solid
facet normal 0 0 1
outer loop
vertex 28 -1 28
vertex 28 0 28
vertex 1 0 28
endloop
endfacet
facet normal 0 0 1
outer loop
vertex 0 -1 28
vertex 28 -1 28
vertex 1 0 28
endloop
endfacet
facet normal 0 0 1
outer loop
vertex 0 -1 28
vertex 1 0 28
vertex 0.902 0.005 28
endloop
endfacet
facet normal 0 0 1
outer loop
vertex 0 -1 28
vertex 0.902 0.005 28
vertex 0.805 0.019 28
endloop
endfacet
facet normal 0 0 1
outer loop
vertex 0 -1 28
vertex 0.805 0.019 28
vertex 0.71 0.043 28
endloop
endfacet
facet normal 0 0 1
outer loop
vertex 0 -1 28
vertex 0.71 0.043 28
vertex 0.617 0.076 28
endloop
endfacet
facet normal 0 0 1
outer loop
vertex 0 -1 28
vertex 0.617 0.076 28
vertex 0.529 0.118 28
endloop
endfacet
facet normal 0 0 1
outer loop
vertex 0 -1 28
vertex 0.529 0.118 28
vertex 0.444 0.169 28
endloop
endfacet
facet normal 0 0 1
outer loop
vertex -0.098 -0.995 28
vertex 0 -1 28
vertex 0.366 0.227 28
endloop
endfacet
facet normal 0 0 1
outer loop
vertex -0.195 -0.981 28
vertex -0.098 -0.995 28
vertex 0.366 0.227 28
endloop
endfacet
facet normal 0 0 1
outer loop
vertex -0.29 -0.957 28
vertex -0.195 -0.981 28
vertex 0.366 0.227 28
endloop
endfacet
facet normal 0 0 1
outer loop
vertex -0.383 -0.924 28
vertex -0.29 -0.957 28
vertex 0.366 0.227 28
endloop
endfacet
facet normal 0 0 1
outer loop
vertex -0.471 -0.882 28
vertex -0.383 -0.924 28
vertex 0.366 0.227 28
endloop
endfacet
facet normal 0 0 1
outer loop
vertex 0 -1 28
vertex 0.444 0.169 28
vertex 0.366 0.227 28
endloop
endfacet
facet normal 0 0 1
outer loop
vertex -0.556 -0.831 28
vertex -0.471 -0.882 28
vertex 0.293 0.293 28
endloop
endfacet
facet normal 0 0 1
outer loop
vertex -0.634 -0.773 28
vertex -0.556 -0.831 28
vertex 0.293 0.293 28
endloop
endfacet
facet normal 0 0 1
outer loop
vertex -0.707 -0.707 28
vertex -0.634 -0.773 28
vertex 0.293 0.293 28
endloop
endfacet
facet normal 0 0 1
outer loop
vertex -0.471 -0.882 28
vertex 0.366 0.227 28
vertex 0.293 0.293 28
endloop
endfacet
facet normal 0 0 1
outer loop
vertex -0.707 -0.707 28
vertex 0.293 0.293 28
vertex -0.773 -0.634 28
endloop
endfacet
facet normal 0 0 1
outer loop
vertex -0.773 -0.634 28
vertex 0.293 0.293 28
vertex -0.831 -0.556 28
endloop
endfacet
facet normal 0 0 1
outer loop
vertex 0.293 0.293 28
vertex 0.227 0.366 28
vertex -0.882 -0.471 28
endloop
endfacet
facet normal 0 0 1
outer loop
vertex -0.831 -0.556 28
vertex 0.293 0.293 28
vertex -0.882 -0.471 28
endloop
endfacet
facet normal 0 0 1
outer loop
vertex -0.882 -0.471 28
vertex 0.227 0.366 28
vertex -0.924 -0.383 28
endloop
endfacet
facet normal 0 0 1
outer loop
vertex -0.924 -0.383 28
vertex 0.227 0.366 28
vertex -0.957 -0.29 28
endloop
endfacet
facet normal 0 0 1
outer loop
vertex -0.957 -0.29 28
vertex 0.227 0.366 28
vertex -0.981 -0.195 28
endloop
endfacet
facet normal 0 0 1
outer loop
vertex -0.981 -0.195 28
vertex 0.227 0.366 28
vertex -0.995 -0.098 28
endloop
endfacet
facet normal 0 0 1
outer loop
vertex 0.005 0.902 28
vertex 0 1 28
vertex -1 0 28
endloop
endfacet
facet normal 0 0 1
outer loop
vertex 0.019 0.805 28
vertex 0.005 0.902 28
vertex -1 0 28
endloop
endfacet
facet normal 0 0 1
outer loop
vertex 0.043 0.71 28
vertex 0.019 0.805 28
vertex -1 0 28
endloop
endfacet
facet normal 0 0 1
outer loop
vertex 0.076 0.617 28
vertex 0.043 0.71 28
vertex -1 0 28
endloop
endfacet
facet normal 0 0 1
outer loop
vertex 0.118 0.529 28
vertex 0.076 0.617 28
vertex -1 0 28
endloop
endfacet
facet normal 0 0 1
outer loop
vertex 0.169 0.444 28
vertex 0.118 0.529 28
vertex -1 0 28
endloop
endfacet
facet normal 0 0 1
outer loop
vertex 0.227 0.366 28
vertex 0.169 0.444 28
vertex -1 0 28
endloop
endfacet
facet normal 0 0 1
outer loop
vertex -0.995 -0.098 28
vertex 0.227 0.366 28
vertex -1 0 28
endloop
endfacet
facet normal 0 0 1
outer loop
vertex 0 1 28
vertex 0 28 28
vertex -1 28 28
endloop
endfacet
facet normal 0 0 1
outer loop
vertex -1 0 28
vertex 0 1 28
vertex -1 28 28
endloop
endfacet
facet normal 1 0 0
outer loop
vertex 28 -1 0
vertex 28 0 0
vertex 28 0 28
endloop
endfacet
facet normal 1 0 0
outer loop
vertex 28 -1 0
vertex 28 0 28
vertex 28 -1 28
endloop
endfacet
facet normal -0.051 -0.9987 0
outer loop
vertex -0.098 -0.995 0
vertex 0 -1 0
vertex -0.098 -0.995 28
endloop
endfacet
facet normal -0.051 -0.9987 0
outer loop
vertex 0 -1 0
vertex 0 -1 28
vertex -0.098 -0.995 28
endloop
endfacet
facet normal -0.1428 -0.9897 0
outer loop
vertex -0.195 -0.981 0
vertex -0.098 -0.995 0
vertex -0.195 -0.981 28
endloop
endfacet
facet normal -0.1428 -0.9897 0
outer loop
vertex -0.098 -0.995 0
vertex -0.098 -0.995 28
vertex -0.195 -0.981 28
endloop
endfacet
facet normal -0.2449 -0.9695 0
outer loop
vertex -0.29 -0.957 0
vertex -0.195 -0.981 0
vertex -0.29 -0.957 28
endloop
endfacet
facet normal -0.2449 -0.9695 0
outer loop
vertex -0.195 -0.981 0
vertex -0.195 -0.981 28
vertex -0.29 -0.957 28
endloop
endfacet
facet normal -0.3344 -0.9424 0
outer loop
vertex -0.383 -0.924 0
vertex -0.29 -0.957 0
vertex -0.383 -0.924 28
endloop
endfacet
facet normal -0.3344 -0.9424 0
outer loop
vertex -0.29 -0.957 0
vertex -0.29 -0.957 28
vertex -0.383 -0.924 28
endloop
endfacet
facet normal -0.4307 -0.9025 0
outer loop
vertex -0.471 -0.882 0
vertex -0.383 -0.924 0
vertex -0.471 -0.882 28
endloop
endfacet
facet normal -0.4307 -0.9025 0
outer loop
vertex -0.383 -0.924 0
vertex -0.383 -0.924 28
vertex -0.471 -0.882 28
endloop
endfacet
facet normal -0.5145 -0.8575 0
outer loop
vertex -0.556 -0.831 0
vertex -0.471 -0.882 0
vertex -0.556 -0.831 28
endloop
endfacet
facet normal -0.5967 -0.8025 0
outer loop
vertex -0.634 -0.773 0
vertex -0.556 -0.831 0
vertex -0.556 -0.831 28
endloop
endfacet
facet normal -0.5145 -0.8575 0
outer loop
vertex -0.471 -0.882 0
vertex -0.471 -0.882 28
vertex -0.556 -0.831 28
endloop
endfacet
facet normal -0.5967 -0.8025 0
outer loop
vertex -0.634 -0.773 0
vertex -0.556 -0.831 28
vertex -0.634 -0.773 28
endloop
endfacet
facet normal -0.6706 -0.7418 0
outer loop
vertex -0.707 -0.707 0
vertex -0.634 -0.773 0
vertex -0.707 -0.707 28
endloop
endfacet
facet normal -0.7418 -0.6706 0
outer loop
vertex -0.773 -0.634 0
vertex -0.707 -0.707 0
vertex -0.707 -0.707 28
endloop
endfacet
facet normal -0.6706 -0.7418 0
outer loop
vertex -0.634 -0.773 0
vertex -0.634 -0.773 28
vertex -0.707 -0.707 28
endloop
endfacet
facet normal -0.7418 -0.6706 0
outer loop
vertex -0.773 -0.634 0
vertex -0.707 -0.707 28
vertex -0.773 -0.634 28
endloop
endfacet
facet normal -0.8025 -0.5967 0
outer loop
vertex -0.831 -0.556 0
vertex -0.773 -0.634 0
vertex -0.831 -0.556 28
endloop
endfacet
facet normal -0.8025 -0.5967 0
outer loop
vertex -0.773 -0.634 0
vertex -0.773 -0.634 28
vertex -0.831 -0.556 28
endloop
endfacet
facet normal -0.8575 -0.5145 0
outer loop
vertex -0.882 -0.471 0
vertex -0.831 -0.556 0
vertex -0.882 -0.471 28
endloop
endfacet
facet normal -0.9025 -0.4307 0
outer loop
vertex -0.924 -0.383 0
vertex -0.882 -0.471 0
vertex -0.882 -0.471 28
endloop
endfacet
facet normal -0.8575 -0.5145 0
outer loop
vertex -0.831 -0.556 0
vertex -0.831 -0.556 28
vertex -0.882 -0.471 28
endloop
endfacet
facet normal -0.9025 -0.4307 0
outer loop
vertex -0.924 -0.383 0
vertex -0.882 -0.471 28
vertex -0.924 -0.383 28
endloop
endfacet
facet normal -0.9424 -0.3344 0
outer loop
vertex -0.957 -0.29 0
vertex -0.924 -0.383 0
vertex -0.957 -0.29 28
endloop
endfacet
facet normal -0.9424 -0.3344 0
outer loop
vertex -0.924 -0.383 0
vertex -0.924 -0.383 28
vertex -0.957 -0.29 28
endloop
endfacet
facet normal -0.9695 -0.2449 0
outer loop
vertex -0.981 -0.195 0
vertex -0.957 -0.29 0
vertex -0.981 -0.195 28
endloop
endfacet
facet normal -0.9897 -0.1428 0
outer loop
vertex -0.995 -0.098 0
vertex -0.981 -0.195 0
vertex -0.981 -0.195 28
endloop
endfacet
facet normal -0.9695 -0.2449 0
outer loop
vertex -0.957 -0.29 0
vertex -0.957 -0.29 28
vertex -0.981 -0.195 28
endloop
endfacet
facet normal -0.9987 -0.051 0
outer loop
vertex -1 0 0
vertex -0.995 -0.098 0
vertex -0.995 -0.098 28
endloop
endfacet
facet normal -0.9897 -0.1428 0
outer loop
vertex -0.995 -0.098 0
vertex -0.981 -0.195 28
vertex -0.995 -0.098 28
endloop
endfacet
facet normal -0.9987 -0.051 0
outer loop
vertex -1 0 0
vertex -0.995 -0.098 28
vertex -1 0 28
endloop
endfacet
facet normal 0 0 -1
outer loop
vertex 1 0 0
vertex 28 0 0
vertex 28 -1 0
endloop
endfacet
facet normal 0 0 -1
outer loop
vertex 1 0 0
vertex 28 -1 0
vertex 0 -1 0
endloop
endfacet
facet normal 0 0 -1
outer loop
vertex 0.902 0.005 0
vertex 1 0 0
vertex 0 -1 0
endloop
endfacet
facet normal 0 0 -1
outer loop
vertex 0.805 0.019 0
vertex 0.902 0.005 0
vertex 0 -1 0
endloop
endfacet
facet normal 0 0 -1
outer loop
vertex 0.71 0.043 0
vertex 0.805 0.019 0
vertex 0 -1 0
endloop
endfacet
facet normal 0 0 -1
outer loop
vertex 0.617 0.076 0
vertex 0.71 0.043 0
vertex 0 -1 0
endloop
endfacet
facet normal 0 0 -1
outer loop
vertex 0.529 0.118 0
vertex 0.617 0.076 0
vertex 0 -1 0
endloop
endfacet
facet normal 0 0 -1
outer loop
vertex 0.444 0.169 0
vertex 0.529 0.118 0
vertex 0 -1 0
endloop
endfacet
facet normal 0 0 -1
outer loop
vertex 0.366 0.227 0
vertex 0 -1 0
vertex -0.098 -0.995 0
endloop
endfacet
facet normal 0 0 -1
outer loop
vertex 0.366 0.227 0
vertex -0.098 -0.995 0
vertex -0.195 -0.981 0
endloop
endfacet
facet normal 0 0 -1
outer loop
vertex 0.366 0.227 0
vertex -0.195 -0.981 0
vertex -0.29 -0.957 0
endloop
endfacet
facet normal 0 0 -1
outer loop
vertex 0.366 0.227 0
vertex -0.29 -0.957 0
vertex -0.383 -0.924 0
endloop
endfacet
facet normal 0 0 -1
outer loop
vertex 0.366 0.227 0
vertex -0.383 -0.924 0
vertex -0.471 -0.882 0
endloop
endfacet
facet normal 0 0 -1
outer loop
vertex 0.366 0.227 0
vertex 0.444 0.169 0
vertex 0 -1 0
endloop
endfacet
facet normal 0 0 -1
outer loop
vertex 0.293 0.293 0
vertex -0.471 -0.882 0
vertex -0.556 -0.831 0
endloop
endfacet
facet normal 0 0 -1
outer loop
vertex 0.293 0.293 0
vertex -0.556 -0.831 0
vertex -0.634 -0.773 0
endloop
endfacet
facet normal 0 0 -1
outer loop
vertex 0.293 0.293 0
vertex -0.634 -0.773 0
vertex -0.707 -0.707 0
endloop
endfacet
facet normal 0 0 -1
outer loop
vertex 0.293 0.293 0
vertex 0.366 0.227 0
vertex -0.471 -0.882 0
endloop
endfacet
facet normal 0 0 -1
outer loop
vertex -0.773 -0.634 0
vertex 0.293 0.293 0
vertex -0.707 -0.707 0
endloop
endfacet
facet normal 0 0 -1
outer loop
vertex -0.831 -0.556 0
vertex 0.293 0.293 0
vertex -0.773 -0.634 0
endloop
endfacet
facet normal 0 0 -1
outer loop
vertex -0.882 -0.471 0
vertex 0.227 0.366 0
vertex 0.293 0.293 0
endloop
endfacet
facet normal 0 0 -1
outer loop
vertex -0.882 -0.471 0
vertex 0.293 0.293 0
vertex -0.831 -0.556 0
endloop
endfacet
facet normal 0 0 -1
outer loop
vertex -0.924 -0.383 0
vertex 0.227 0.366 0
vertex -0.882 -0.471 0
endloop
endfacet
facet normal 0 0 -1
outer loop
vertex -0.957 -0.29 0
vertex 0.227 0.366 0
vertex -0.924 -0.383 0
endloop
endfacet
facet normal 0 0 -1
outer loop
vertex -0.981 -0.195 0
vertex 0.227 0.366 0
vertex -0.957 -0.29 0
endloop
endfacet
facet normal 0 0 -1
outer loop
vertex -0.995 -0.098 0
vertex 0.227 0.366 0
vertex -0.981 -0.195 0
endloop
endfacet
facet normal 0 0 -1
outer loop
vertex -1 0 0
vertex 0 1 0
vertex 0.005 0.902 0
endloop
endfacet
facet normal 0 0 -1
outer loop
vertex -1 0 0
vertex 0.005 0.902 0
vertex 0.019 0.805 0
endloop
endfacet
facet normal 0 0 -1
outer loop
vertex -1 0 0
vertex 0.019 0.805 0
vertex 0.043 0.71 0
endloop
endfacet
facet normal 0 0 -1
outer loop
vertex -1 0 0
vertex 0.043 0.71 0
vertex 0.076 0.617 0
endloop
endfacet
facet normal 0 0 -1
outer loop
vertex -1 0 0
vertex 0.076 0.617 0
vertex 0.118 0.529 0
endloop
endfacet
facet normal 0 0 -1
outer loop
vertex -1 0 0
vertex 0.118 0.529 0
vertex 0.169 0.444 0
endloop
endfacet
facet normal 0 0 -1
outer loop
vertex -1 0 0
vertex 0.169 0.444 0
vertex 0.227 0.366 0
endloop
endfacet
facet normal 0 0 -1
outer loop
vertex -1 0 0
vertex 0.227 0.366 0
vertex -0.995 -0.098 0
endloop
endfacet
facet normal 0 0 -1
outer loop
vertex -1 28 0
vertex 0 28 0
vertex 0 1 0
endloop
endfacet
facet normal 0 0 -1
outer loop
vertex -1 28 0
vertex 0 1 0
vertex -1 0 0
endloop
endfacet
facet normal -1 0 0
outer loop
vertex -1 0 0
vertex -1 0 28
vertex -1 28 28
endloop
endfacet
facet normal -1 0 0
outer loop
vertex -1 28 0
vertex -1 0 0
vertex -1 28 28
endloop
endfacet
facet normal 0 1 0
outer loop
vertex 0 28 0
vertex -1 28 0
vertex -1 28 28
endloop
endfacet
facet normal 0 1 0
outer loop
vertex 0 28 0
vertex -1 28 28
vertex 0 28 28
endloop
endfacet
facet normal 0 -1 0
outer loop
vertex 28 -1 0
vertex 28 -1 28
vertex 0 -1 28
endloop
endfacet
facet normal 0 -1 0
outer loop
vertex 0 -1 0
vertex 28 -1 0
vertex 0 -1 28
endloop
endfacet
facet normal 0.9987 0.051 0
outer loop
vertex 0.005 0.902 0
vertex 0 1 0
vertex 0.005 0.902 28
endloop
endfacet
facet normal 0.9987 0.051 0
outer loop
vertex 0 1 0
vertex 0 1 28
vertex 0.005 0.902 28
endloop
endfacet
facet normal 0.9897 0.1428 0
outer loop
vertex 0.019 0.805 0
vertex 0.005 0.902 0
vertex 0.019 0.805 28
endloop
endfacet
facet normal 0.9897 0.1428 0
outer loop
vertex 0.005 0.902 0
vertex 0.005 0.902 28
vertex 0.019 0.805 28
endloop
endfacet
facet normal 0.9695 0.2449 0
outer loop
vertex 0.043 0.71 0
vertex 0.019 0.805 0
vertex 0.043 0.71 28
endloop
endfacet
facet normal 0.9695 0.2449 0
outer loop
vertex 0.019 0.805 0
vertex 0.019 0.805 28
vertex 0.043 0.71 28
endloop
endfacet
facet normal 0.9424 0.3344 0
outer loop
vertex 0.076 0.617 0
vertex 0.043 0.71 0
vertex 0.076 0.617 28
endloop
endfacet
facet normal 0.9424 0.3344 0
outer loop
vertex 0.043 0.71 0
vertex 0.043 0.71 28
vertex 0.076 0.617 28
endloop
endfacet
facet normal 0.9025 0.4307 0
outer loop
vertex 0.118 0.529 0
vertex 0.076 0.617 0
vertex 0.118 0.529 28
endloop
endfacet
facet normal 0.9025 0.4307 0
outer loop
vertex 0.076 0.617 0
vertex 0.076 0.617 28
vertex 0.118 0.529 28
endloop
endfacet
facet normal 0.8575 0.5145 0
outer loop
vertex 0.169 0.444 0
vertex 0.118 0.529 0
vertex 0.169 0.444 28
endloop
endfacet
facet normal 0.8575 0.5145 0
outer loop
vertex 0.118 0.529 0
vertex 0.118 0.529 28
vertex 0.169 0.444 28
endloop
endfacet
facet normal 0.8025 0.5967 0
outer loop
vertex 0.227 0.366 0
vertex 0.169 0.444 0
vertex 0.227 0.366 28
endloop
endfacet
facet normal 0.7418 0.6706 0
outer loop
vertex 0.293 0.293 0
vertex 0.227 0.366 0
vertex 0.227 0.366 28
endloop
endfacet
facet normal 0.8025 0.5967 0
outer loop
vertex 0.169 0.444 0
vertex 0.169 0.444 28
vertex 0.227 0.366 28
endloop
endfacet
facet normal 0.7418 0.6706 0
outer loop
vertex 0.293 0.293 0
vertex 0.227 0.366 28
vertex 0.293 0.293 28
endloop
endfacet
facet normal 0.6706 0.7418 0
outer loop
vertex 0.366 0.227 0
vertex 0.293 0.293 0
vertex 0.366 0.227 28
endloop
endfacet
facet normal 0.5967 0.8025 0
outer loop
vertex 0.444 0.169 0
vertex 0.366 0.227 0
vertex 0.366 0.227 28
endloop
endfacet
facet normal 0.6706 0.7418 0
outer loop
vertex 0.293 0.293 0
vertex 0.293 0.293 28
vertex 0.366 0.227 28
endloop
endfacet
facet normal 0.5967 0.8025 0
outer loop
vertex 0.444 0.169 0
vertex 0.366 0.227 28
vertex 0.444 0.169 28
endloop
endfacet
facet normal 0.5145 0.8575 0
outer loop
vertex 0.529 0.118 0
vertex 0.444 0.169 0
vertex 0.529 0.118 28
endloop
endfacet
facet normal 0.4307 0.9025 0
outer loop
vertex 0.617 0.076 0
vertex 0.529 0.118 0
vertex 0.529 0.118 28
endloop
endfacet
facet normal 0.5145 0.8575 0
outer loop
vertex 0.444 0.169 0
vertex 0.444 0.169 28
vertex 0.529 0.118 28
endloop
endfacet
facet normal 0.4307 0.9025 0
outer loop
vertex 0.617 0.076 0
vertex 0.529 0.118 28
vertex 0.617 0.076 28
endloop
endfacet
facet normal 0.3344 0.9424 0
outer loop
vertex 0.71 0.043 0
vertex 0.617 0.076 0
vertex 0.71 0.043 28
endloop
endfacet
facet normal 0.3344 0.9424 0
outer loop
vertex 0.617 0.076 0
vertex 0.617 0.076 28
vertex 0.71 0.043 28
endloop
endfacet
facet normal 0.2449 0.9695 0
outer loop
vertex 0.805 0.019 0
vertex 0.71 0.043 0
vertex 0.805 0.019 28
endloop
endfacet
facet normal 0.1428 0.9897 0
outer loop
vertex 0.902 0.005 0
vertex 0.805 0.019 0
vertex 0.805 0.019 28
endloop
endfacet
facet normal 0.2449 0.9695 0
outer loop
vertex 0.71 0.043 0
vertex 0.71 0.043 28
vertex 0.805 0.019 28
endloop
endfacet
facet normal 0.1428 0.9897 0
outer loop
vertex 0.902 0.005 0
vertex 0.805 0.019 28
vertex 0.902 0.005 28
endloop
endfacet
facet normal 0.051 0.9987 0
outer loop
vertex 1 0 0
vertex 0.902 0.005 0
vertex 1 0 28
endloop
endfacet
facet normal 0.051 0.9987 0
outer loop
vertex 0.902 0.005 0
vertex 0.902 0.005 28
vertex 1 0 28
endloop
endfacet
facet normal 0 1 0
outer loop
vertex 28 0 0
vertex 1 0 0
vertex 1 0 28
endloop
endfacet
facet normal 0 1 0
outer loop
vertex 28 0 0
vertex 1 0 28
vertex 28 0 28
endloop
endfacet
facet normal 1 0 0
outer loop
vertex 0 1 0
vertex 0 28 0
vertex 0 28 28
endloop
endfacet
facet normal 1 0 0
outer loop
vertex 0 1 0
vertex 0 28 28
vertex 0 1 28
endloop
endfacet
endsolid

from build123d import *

# Parameters (mm, degrees)
EXTRUDE_1_DEPTH = 28
FILLET_1_R      = 1


with BuildPart() as part:
    # 草图1 → 拉伸-薄壁1 (new body)
    with BuildSketch(Plane.XY):
        Polygon((0, 28), (0, 0), (28, 0), (28, -1), (-1, -1), (-1, 28), align=None)
    extrude(amount=EXTRUDE_1_DEPTH)

    # 圆角1
    fillet_1_edges = [part.edges().sort_by_distance(p)[0] for p in [
        (-1, -1, 14),
        (0, 0, 14),
    ]]
    fillet(fillet_1_edges, radius=FILLET_1_R)


solid = part.part
